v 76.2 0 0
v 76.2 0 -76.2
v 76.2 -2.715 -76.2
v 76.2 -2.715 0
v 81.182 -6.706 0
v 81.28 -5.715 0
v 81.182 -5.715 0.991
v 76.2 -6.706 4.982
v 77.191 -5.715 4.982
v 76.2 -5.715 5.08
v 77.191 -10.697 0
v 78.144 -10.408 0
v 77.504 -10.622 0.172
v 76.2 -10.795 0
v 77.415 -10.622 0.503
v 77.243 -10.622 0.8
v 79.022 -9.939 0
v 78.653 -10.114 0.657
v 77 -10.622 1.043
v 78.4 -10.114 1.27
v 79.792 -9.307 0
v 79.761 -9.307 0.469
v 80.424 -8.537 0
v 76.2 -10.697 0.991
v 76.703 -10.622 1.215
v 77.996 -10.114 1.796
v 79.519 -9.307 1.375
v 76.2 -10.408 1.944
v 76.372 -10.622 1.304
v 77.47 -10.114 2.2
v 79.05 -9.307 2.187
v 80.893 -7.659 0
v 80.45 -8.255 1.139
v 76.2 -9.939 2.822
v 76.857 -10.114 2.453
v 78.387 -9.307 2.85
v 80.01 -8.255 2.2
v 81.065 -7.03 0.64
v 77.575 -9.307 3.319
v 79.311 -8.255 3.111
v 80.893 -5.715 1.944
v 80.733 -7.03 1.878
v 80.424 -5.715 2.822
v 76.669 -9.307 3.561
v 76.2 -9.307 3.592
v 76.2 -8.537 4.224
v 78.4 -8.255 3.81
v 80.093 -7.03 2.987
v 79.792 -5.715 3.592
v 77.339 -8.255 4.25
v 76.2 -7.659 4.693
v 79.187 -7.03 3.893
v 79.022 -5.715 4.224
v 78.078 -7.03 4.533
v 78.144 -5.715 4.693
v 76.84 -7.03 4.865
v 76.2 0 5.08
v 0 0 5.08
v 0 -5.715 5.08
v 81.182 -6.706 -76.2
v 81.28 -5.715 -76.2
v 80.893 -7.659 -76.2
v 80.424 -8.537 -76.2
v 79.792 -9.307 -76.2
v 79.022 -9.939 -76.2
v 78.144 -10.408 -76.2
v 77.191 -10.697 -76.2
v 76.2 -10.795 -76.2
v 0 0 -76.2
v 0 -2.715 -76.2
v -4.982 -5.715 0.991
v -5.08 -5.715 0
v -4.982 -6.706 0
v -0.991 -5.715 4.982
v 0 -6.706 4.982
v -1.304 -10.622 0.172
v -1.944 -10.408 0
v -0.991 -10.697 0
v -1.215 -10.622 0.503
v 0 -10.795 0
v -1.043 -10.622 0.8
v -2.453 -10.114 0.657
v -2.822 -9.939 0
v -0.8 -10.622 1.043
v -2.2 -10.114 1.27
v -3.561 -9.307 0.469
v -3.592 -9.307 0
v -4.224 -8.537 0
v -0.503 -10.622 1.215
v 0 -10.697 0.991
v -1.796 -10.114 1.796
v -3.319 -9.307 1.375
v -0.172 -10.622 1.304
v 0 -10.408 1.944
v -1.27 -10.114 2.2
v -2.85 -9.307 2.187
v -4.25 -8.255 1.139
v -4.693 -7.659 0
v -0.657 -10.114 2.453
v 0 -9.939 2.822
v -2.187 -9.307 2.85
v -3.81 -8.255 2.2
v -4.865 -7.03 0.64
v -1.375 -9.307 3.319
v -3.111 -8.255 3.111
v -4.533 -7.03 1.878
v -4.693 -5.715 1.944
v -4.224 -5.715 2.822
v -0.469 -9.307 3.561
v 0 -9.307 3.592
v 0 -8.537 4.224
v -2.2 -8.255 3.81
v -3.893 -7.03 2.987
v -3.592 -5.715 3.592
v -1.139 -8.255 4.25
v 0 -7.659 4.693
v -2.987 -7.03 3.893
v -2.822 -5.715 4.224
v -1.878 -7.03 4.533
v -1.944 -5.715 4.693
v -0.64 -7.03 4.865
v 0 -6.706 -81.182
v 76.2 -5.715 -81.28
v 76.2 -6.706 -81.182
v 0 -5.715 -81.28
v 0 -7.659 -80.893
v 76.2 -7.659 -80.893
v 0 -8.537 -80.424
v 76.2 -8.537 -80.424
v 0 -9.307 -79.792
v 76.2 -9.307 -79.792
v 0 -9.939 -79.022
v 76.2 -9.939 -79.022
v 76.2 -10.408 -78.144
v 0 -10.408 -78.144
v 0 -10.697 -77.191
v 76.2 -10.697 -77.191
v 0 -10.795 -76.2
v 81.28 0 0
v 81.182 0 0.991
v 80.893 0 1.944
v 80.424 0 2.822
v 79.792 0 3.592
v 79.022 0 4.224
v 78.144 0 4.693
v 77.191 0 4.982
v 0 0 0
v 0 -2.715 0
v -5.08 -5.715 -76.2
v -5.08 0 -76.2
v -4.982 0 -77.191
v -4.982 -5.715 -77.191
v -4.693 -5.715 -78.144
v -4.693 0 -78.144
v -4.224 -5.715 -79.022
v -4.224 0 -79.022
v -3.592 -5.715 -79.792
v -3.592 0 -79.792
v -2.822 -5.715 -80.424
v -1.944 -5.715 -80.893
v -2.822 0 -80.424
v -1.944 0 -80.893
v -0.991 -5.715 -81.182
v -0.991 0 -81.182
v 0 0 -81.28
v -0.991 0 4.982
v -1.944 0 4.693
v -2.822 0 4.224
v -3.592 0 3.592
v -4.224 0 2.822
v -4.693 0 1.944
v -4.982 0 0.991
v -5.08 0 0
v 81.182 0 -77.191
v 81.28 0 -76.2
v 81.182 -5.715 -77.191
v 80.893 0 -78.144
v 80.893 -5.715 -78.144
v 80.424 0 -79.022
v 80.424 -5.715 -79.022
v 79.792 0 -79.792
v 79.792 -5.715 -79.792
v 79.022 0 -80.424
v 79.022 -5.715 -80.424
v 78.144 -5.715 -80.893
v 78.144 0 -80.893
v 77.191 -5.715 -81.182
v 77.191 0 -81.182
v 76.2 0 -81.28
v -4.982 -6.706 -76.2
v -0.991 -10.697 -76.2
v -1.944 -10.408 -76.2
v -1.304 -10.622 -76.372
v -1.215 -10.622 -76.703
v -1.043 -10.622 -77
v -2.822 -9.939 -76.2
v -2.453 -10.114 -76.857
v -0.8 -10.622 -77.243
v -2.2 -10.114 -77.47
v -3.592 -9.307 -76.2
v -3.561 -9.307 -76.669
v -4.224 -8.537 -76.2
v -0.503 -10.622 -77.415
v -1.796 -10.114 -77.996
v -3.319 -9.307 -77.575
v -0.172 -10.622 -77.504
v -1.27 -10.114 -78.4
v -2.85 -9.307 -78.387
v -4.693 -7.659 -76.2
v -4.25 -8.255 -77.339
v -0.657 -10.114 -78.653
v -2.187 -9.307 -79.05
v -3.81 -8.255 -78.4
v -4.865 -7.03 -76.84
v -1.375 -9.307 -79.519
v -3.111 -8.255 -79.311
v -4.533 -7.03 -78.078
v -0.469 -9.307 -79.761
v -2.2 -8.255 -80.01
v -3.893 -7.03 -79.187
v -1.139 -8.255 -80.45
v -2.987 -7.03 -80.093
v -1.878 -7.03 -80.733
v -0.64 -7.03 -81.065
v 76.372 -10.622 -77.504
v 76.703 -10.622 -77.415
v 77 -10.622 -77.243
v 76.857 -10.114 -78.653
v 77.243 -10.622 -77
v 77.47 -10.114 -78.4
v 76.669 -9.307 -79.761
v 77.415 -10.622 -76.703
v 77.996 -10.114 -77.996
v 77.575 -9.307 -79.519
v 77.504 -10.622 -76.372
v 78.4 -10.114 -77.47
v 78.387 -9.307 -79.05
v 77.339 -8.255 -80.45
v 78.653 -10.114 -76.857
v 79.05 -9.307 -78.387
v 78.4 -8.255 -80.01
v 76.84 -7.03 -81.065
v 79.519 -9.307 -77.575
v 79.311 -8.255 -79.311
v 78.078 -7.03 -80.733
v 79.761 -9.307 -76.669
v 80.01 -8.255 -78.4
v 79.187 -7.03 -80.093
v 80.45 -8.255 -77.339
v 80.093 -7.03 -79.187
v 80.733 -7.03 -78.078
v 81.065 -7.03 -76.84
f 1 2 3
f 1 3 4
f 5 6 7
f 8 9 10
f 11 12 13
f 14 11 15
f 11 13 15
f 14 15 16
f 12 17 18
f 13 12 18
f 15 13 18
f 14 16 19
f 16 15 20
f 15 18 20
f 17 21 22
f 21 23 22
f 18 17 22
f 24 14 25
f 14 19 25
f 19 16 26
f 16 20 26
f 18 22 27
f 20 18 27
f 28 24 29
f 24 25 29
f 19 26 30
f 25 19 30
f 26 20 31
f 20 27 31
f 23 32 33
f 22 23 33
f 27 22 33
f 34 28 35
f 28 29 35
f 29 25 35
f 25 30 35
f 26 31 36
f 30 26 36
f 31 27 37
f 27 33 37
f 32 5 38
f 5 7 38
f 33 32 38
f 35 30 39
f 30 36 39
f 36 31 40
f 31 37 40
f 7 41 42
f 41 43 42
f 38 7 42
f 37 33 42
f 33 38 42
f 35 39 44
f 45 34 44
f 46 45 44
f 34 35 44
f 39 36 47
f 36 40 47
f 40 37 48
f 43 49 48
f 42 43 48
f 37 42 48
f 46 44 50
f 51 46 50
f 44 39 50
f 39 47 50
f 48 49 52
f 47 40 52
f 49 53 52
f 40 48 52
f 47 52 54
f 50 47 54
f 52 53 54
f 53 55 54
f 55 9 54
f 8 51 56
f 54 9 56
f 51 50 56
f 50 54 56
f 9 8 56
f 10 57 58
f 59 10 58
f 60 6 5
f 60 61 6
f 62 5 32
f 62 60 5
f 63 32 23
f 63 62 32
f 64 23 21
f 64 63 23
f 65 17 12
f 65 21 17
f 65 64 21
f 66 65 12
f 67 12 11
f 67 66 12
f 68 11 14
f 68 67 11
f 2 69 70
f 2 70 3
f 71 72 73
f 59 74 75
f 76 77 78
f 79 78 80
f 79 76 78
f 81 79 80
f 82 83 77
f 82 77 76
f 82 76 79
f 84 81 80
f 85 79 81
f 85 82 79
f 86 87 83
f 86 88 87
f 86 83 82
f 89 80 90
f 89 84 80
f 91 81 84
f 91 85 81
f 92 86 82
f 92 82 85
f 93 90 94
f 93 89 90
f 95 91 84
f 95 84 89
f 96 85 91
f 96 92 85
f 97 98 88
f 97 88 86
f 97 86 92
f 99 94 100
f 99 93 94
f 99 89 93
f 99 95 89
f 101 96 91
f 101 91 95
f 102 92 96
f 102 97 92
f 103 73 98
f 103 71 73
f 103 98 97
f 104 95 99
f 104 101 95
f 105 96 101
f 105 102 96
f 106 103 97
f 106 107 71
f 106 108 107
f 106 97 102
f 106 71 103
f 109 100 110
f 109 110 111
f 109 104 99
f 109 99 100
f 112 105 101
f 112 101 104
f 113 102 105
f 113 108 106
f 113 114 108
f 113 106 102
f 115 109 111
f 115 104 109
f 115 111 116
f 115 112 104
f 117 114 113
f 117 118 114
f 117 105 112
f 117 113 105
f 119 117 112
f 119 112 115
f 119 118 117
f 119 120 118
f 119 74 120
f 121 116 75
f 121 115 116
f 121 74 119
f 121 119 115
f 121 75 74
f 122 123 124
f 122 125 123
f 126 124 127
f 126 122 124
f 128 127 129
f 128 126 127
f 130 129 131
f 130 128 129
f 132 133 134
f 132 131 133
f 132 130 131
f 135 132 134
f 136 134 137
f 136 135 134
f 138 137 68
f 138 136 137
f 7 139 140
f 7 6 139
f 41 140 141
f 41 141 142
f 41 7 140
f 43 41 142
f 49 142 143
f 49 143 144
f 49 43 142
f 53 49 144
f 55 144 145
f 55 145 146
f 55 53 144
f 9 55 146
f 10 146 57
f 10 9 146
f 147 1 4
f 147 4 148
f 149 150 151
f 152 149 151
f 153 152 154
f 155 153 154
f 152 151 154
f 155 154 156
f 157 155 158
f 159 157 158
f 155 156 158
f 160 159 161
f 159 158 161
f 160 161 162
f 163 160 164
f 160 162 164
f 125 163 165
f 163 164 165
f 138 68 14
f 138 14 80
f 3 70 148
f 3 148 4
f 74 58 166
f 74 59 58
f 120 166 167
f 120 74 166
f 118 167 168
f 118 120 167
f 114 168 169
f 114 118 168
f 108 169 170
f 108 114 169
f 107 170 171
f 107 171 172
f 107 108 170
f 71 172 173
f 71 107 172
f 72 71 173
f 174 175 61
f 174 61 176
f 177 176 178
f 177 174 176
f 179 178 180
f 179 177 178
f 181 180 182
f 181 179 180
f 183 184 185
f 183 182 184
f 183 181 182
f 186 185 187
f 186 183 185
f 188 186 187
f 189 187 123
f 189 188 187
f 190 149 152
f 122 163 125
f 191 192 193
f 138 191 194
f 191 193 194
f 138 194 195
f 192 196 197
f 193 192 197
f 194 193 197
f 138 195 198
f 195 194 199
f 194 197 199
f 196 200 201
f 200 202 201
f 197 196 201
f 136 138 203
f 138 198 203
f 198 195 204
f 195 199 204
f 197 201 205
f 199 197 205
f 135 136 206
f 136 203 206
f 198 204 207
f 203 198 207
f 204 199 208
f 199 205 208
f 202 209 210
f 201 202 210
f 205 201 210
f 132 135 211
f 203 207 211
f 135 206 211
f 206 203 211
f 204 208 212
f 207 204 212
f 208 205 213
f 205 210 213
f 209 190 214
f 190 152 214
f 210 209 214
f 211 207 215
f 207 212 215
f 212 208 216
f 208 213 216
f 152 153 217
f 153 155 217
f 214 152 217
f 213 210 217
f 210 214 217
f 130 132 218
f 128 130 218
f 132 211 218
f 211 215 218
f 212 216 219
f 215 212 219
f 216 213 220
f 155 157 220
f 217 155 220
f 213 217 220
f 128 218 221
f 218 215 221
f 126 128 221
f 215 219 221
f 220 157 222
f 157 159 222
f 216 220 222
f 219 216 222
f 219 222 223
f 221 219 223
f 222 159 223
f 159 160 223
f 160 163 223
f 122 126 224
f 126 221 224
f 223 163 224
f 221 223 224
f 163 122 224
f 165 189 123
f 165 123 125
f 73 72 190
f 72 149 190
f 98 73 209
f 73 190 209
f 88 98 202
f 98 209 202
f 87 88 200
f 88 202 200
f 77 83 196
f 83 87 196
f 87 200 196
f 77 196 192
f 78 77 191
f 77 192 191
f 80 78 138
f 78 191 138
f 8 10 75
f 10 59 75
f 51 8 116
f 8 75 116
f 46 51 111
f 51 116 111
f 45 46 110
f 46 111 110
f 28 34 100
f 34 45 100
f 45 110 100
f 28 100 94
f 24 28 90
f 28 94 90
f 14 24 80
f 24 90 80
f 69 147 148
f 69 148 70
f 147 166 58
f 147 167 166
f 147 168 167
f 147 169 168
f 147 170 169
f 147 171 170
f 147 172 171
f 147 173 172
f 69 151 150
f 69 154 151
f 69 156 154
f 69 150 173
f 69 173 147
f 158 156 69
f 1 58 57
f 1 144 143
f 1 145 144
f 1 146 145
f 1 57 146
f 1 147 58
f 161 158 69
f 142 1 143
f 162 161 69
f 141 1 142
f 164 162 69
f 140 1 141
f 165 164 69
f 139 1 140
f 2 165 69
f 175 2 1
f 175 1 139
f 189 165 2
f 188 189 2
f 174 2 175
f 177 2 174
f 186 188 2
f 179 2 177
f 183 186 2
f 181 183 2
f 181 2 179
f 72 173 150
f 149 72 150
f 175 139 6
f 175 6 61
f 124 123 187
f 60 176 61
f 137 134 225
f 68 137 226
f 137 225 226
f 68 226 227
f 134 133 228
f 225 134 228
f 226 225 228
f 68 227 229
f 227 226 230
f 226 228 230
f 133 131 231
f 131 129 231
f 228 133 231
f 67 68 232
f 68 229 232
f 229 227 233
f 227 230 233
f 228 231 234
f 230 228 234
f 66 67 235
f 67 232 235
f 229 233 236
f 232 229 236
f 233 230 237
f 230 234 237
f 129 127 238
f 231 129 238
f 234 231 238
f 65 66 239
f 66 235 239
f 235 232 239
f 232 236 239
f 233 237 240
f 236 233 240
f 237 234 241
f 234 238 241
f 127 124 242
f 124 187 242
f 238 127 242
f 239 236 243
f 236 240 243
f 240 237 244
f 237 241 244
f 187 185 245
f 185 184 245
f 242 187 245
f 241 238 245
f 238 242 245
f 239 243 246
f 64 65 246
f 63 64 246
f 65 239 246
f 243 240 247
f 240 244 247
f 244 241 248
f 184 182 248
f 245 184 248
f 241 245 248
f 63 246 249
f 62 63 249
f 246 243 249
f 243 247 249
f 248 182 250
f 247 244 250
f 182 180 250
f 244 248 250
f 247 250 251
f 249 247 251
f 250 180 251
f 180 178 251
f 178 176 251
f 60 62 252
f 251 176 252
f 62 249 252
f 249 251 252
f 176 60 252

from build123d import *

# Parameters (mm, degrees)
SKETCH1_W           = 5.08
SKETCH1_H           = 5.08
BOSS_EXTRUDE1_DEPTH = 5.715
SKETCH2_W           = 86.36
SKETCH2_H           = 86.36
BOSS_EXTRUDE2_DEPTH = 5.08
FILLET1_R           = 5.08
SKETCH3_W           = 76.2
SKETCH3_H           = 76.2
BOSS_EXTRUDE3_DEPTH = 3


with BuildPart() as part:
    # Sketch1 → Boss-Extrude1 (new body)
    with BuildSketch(Plane(origin=(0, 0, 0), x_dir=(1, 0, 0), z_dir=(0, 1, 0))):
        Polygon((-5.08, 0), (0, 0), (0, 76.2), (76.2, 76.2), (76.2, 81.28), (-5.08, 81.28), align=None)
        Polygon((76.2, 0), (0, 0), (0, -5.08), (81.28, -5.08), (81.28, 76.2), (76.2, 76.2), align=None)
        with Locations((-2.54, -2.54)):
            Rectangle(SKETCH1_W, SKETCH1_H)
        with Locations((78.74, 78.74)):
            Rectangle(SKETCH1_W, SKETCH1_H)
    extrude(amount=-BOSS_EXTRUDE1_DEPTH)

    # Sketch2 → Boss-Extrude2 (add)
    with BuildSketch(Plane(origin=(0, -5.715, 0), x_dir=(-1, 0, 0), z_dir=(0, -1, 0))):
        with Locations((-38.1, 38.1)):
            Rectangle(SKETCH2_W, SKETCH2_H)
    extrude(amount=BOSS_EXTRUDE2_DEPTH)

    # Fillet1
    fillet1_edges = [part.edges().sort_by_distance(p)[0] for p in [
        (-5.08, -5.3975, 5.08),
        (-5.08, -5.3975, -81.28),
        (81.28, -5.3975, -81.28),
        (81.28, -5.3975, 5.08),
        (-5.08, -10.795, -38.1),
        (38.1, -10.795, -81.28),
        (81.28, -10.795, -38.1),
        (38.1, -10.795, 5.08),
    ]]
    fillet(fillet1_edges, radius=FILLET1_R)

    # Sketch3 → Boss-Extrude3 (add)
    with BuildSketch(Plane(origin=(0, -5.715, 0), x_dir=(1, 0, 0), z_dir=(0, 1, 0))):
        with Locations((38.1, 38.1)):
            Rectangle(SKETCH3_W, SKETCH3_H)
    extrude(amount=BOSS_EXTRUDE3_DEPTH)


solid = part.part
